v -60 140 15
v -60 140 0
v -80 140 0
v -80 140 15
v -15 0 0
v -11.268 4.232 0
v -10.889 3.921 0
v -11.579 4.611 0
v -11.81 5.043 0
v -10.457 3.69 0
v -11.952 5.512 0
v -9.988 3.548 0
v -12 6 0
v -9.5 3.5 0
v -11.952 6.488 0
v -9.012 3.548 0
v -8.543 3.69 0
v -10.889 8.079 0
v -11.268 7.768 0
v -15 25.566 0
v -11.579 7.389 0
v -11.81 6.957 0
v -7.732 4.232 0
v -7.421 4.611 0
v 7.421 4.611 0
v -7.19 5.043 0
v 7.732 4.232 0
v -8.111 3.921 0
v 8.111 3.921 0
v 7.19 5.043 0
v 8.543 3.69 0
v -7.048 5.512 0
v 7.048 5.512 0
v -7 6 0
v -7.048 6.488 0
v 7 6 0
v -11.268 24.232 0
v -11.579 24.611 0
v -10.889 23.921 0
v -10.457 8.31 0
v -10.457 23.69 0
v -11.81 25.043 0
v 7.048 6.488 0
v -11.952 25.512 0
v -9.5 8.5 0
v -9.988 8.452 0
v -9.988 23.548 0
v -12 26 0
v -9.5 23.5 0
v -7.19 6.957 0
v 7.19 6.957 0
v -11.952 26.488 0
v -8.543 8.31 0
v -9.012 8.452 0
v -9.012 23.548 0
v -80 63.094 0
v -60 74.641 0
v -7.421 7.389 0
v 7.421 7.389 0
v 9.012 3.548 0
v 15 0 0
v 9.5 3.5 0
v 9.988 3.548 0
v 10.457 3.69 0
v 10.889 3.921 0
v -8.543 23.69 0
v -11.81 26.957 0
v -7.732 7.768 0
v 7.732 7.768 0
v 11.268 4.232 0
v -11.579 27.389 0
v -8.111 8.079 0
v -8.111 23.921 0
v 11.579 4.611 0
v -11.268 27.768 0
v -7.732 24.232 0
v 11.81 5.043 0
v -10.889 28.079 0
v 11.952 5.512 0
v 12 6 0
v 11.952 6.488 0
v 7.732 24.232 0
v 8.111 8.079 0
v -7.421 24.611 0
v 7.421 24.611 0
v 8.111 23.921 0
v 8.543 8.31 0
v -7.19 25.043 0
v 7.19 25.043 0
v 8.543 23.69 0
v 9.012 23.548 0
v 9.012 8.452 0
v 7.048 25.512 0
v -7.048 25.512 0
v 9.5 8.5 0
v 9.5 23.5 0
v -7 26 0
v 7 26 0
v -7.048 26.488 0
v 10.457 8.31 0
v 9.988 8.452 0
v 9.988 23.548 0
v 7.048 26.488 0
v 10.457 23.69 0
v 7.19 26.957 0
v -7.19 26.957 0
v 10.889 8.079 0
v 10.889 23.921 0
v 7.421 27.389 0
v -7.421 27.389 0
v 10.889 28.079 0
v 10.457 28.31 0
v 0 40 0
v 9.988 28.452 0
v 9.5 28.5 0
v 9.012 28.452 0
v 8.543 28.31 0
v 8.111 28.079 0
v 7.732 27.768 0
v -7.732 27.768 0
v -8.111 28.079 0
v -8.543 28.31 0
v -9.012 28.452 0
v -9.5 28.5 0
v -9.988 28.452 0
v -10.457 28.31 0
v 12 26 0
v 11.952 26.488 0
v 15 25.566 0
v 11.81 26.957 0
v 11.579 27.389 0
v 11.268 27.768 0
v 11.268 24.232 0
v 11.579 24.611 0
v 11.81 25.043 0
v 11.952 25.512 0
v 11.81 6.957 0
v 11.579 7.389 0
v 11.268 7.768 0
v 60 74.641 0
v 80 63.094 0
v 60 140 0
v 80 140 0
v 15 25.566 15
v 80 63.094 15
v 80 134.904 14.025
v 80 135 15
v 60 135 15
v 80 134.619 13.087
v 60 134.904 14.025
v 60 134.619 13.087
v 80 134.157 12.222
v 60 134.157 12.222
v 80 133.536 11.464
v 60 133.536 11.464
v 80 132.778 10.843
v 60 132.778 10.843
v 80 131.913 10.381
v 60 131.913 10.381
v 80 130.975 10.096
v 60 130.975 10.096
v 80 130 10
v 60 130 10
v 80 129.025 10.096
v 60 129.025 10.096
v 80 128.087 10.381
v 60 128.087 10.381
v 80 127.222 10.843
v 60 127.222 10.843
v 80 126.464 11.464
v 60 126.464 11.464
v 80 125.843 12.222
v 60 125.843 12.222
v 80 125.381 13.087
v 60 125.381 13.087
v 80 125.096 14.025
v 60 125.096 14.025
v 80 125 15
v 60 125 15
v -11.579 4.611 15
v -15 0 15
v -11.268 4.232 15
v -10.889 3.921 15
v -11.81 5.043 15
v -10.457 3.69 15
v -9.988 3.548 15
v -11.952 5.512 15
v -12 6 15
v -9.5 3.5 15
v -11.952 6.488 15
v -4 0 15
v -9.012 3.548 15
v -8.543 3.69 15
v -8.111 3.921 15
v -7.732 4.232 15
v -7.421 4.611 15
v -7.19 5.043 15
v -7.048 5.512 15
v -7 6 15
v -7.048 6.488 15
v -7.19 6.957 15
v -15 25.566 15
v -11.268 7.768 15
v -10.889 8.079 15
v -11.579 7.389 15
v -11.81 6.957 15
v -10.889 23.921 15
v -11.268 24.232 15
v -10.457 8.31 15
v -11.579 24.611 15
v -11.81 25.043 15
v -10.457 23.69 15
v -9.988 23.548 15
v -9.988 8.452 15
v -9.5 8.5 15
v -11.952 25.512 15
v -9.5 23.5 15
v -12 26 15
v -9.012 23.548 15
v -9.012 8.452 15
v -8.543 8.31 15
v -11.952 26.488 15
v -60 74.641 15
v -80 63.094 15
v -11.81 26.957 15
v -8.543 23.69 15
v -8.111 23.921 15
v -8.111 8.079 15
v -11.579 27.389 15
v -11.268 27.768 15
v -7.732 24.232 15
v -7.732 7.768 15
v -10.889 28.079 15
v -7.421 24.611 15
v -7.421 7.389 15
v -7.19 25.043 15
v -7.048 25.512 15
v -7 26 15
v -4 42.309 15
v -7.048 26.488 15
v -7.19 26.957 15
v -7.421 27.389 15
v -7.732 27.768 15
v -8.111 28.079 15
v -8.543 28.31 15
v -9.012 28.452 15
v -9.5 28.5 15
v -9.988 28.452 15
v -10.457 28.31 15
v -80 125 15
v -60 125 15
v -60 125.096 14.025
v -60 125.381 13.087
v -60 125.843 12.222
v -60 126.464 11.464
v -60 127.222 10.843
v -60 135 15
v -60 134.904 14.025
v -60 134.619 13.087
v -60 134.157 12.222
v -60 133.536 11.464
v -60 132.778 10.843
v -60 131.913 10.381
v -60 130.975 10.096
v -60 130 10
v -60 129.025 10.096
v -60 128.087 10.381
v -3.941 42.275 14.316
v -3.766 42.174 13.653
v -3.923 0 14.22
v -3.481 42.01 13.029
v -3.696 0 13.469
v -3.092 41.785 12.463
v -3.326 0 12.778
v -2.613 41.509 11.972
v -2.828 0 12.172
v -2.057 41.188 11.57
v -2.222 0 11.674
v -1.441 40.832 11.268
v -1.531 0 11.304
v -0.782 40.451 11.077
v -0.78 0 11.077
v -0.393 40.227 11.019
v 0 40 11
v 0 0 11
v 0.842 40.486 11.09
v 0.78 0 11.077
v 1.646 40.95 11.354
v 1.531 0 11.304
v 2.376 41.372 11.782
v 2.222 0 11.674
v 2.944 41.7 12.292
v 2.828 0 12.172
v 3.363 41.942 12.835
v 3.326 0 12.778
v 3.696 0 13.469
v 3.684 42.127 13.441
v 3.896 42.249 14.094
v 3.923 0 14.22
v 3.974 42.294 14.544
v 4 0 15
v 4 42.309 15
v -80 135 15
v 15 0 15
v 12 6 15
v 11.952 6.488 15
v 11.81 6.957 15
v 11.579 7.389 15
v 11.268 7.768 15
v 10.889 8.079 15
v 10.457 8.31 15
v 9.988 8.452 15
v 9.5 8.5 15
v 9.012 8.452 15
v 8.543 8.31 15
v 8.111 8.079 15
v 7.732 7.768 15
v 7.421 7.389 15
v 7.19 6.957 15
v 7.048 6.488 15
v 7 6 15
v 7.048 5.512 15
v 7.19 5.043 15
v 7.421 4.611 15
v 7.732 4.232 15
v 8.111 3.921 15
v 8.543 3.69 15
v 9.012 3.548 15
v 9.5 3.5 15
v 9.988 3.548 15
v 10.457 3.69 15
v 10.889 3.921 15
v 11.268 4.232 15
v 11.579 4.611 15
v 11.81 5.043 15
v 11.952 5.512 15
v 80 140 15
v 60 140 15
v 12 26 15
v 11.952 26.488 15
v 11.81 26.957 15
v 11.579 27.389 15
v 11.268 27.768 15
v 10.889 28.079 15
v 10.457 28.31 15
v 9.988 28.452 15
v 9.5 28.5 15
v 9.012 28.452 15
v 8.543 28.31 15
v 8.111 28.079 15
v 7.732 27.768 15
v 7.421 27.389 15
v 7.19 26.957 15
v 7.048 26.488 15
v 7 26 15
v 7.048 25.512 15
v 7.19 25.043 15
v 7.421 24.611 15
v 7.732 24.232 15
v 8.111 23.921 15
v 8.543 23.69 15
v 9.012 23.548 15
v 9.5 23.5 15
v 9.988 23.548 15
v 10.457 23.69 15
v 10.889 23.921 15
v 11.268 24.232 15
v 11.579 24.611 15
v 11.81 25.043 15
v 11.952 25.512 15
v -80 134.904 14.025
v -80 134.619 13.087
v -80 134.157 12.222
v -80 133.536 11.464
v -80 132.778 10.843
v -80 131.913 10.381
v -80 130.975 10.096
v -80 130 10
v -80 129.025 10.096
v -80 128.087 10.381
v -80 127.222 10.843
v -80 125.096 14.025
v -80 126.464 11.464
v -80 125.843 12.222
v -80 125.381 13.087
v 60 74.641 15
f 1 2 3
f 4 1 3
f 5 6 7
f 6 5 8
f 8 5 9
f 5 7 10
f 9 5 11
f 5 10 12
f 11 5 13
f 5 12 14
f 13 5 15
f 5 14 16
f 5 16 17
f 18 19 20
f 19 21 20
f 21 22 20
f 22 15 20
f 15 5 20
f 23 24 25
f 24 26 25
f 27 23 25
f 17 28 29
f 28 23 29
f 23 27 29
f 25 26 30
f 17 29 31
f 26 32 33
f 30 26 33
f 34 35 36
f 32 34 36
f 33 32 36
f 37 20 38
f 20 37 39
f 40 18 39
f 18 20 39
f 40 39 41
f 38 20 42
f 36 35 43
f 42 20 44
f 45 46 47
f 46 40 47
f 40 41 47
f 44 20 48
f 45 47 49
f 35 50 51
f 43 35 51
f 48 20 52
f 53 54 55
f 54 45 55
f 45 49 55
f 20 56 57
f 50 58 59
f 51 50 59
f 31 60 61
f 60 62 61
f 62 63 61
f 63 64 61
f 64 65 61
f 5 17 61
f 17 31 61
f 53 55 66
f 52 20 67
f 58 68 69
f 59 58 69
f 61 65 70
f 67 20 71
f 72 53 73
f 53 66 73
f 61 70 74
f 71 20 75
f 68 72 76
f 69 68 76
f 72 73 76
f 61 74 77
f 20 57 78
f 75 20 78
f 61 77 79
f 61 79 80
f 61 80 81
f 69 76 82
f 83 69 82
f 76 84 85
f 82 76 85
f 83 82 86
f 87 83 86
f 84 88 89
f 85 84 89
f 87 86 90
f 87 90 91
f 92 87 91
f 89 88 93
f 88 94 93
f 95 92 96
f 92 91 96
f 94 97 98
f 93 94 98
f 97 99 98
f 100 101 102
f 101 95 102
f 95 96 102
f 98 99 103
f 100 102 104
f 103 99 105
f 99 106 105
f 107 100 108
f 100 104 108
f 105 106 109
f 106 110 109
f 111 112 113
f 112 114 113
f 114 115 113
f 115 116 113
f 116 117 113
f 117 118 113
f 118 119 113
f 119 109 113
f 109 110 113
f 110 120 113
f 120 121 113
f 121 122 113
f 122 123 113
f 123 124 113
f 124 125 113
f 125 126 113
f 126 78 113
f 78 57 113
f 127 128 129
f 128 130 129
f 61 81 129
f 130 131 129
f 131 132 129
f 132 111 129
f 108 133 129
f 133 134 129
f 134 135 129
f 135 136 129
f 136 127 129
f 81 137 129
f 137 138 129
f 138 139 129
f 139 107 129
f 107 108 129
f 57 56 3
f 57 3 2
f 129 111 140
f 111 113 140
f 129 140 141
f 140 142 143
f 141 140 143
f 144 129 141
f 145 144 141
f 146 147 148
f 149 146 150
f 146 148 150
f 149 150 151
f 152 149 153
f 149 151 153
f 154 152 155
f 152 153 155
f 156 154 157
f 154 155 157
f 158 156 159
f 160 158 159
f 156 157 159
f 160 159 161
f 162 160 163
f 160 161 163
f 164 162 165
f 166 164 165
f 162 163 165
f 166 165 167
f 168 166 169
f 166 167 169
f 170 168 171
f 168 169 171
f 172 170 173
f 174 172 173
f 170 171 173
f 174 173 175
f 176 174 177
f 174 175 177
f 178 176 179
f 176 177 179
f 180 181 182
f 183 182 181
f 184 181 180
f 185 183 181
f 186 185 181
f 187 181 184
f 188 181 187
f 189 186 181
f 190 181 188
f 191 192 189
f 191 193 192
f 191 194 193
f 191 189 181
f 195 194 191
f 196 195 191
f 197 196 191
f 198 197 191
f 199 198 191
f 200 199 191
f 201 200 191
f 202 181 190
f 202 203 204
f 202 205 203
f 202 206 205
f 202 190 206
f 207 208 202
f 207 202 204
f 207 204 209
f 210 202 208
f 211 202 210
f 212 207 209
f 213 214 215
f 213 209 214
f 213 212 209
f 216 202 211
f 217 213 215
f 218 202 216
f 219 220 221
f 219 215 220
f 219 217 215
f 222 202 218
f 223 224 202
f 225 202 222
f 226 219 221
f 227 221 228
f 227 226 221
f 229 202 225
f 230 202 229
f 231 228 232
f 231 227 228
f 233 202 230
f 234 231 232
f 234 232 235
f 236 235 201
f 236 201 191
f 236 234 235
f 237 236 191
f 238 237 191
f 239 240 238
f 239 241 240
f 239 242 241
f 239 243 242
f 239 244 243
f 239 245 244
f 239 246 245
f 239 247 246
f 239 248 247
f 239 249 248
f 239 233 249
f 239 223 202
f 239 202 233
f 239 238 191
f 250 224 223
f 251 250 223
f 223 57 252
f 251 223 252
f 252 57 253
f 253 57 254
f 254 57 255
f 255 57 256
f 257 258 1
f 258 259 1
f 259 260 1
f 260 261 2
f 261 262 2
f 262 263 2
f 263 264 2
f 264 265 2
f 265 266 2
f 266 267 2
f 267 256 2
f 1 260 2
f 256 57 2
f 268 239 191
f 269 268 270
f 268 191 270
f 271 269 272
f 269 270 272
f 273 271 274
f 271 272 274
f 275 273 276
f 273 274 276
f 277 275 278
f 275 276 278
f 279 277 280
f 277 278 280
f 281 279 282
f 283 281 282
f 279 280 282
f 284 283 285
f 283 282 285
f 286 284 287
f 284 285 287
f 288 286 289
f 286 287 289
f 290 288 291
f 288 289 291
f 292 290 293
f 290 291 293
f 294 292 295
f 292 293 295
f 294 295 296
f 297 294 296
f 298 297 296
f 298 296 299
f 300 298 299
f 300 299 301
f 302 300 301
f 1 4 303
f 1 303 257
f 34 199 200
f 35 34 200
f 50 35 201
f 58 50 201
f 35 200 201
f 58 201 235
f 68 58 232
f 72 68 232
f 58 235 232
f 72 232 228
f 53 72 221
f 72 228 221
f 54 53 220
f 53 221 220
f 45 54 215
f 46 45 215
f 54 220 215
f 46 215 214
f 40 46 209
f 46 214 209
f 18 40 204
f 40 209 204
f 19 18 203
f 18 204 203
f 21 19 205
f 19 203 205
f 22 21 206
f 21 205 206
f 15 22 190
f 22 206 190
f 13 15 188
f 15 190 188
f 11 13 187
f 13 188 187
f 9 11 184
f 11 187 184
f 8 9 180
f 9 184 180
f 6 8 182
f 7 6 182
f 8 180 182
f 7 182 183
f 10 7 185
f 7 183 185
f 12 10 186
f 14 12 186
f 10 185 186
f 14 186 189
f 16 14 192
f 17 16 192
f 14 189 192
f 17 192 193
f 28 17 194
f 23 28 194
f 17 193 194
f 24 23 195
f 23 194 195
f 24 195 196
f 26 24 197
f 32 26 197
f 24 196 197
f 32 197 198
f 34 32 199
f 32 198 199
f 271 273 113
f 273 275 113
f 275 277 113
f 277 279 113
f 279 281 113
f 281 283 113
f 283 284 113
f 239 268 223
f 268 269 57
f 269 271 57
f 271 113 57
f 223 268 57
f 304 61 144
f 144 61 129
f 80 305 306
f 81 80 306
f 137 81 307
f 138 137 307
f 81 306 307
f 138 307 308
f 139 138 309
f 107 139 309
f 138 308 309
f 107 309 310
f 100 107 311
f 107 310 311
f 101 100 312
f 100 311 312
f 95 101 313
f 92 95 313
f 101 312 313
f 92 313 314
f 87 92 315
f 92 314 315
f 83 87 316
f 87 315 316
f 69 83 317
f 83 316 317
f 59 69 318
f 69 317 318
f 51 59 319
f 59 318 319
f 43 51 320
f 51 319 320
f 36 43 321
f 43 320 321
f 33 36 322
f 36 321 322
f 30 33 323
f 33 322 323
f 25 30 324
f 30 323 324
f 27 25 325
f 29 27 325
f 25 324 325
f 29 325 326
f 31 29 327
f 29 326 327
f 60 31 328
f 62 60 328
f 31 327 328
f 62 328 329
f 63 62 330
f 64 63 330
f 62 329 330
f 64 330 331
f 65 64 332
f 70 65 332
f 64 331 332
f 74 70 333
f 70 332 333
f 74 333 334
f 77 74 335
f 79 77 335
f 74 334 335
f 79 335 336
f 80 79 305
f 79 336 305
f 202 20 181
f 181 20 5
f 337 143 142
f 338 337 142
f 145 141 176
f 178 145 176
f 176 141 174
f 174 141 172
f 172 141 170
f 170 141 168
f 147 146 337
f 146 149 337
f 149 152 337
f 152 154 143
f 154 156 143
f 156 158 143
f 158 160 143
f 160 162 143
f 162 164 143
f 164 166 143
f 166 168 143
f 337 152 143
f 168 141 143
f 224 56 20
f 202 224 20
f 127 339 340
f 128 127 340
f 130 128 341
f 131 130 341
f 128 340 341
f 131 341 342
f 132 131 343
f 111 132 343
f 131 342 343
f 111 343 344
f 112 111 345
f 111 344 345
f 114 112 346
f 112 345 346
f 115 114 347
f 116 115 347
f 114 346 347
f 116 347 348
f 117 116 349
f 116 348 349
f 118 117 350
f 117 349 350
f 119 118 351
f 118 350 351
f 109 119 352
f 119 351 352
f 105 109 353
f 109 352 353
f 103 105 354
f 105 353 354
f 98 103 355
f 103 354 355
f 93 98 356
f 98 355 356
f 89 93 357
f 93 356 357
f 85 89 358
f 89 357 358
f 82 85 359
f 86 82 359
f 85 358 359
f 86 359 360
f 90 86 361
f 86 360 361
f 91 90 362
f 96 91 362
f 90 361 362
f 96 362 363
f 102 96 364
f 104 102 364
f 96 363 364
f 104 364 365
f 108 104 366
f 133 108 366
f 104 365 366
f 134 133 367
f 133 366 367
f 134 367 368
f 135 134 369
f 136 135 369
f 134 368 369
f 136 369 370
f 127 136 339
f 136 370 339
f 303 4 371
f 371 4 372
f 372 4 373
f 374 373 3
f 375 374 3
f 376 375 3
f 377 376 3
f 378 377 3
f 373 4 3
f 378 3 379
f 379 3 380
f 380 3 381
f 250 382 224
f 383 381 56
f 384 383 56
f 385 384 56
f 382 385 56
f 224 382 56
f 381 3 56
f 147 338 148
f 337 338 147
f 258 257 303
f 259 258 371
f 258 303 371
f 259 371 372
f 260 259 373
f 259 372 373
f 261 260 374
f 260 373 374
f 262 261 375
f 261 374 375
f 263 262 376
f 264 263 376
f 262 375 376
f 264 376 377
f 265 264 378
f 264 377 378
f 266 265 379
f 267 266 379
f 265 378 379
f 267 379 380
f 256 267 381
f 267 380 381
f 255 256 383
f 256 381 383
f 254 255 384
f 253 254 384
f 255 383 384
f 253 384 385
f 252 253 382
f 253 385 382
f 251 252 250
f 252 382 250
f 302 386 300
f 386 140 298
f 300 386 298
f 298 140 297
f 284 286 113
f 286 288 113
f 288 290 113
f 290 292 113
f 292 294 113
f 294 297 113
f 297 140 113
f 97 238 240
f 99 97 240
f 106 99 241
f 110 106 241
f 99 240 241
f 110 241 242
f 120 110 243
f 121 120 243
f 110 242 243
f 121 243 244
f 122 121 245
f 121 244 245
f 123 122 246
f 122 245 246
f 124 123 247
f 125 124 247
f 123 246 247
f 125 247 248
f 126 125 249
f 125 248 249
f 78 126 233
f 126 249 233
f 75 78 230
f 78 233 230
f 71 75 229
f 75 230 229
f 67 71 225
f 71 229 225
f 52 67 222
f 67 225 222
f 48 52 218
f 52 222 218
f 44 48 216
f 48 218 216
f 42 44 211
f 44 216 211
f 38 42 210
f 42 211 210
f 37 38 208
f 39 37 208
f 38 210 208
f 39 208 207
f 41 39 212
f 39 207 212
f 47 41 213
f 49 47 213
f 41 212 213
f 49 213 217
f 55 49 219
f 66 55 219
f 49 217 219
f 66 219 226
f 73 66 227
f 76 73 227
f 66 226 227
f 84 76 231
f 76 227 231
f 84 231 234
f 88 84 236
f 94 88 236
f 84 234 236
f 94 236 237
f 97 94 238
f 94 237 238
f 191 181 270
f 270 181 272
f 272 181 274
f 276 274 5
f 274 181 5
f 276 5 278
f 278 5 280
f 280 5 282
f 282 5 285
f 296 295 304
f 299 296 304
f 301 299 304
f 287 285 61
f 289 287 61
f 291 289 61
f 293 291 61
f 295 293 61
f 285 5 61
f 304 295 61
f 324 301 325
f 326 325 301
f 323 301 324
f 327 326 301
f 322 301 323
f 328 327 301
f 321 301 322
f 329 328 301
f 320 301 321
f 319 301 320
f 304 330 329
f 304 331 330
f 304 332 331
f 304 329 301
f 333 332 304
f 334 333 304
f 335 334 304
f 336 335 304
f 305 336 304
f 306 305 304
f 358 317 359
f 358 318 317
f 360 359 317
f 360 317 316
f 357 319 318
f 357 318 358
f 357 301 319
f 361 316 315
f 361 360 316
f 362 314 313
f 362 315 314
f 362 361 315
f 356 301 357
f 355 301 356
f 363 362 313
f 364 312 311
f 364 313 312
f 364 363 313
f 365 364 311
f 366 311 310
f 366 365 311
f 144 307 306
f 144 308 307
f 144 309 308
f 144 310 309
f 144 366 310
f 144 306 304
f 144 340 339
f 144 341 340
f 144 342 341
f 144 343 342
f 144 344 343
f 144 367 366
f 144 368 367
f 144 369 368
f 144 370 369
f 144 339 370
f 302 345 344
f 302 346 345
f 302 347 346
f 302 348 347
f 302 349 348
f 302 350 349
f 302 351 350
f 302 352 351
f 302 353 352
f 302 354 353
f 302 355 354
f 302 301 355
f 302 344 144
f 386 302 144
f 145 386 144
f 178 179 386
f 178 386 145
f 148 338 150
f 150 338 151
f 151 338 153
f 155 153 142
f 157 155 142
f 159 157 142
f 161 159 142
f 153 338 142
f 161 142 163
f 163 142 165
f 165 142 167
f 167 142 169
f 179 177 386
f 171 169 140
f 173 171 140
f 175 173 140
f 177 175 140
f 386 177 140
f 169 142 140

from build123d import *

# Parameters (mm, degrees)
F1_DEPTH = 15
F3_DEPTH = 50
F5_DEPTH = 160
F6_R     = 2.5
F7_DEPTH = 15


with BuildPart() as f1:
    # F0 (on Top) → F1 (new body)
    with BuildSketch(Plane.XY):
        Polygon((-15, 0), (15, 0), (15, 25.566243), (80, 63.094011), (80, 140), (60, 140), (60, 74.641016), (0, 40), (-60, 74.641016), (-60, 140), (-80, 140), (-80, 63.094011), (-15, 25.566243), align=None)
    extrude(amount=F1_DEPTH)

    # F2 (on face) → F3 (cut)
    with BuildSketch(Plane.XZ):
        with BuildLine():
            Line((4, 15), (-4, 15))
            ThreePointArc((-4, 15), (0, 11), (4, 15))
        make_face()
    extrude(amount=-F3_DEPTH, mode=Mode.SUBTRACT)

    # F4 (on face) → F5 (cut, through all)
    with BuildSketch(Plane(origin=(-80, 0, 0), x_dir=(0, -1, 0), z_dir=(-1, 0, 0))):
        with BuildLine():
            Line((-125, 15), (-135, 15))
            ThreePointArc((-135, 15), (-130, 10), (-125, 15))
        make_face()
    extrude(amount=-F5_DEPTH, mode=Mode.SUBTRACT)

    # F6 (on face) → F7 (cut, through all)
    with BuildSketch(Plane.XY.offset(15)):
        with Locations((-9.5, 6)):
            Circle(F6_R)
        with Locations((-9.5, 26)):
            Circle(F6_R)
        with Locations((9.5, 6)):
            Circle(F6_R)
        with Locations((9.5, 26)):
            Circle(F6_R)
    extrude(amount=-F7_DEPTH, mode=Mode.SUBTRACT)


solid = f1.part
